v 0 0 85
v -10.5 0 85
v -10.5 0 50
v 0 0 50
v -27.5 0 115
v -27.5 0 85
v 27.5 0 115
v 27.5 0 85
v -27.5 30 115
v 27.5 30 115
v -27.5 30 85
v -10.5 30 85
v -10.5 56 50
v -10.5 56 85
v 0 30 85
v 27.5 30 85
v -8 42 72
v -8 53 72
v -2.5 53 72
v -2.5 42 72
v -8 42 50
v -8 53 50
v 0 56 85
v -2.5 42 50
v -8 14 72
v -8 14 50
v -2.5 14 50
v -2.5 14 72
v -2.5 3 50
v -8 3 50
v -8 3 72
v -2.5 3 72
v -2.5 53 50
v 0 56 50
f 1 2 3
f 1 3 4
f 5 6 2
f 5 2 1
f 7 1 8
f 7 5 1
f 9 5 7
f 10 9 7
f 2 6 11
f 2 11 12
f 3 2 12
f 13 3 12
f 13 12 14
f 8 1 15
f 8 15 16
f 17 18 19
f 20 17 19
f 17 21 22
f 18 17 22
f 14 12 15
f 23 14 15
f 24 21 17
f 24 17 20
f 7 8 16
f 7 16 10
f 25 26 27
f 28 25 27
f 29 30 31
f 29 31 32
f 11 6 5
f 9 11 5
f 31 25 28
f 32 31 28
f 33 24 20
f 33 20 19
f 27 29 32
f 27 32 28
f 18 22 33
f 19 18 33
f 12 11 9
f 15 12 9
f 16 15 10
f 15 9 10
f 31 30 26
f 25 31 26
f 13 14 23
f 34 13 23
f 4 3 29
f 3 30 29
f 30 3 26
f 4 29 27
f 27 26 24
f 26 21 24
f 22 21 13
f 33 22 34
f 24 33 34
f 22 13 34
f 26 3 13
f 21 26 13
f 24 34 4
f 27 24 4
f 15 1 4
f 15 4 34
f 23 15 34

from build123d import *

# Parameters (mm, degrees)
SKETCH1_W           = 55
SKETCH1_H           = 30
BOSS_EXTRUDE1_DEPTH = 30
SKETCH2_W           = 10.5
SKETCH2_H           = 56
BOSS_EXTRUDE2_DEPTH = 35
SKETCH3_W           = 5.5
SKETCH3_H           = 11
CUT_EXTRUDE1_DEPTH  = 22


with BuildPart() as part:
    # Sketch1 → Boss-Extrude1 (new body)
    with BuildSketch(Plane(origin=(0, 0, 0), x_dir=(1, 0, 0), z_dir=(0, 1, 0))):
        Rectangle(SKETCH1_W, SKETCH1_H)
    extrude(amount=BOSS_EXTRUDE1_DEPTH)

    # Sketch2 → Boss-Extrude2 (add)
    with BuildSketch(Plane.XY.offset(15)):
        with Locations((-5.25, 28)):
            Rectangle(SKETCH2_W, SKETCH2_H)
    extrude(amount=BOSS_EXTRUDE2_DEPTH)

    # Sketch3 → Cut-Extrude1 (cut)
    with BuildSketch(Plane.XY.offset(50)):
        with Locations((-5.25, 8.5)):
            Rectangle(SKETCH3_W, SKETCH3_H)
        with Locations((-5.25, 47.5)):
            Rectangle(SKETCH3_W, SKETCH3_H)
    extrude(amount=-CUT_EXTRUDE1_DEPTH, mode=Mode.SUBTRACT)


with BuildPart() as body_2:
    # Mirror1: mirrored copy
    add(part.part.mirror(Plane.XY.offset(50)))


solid = body_2.part
